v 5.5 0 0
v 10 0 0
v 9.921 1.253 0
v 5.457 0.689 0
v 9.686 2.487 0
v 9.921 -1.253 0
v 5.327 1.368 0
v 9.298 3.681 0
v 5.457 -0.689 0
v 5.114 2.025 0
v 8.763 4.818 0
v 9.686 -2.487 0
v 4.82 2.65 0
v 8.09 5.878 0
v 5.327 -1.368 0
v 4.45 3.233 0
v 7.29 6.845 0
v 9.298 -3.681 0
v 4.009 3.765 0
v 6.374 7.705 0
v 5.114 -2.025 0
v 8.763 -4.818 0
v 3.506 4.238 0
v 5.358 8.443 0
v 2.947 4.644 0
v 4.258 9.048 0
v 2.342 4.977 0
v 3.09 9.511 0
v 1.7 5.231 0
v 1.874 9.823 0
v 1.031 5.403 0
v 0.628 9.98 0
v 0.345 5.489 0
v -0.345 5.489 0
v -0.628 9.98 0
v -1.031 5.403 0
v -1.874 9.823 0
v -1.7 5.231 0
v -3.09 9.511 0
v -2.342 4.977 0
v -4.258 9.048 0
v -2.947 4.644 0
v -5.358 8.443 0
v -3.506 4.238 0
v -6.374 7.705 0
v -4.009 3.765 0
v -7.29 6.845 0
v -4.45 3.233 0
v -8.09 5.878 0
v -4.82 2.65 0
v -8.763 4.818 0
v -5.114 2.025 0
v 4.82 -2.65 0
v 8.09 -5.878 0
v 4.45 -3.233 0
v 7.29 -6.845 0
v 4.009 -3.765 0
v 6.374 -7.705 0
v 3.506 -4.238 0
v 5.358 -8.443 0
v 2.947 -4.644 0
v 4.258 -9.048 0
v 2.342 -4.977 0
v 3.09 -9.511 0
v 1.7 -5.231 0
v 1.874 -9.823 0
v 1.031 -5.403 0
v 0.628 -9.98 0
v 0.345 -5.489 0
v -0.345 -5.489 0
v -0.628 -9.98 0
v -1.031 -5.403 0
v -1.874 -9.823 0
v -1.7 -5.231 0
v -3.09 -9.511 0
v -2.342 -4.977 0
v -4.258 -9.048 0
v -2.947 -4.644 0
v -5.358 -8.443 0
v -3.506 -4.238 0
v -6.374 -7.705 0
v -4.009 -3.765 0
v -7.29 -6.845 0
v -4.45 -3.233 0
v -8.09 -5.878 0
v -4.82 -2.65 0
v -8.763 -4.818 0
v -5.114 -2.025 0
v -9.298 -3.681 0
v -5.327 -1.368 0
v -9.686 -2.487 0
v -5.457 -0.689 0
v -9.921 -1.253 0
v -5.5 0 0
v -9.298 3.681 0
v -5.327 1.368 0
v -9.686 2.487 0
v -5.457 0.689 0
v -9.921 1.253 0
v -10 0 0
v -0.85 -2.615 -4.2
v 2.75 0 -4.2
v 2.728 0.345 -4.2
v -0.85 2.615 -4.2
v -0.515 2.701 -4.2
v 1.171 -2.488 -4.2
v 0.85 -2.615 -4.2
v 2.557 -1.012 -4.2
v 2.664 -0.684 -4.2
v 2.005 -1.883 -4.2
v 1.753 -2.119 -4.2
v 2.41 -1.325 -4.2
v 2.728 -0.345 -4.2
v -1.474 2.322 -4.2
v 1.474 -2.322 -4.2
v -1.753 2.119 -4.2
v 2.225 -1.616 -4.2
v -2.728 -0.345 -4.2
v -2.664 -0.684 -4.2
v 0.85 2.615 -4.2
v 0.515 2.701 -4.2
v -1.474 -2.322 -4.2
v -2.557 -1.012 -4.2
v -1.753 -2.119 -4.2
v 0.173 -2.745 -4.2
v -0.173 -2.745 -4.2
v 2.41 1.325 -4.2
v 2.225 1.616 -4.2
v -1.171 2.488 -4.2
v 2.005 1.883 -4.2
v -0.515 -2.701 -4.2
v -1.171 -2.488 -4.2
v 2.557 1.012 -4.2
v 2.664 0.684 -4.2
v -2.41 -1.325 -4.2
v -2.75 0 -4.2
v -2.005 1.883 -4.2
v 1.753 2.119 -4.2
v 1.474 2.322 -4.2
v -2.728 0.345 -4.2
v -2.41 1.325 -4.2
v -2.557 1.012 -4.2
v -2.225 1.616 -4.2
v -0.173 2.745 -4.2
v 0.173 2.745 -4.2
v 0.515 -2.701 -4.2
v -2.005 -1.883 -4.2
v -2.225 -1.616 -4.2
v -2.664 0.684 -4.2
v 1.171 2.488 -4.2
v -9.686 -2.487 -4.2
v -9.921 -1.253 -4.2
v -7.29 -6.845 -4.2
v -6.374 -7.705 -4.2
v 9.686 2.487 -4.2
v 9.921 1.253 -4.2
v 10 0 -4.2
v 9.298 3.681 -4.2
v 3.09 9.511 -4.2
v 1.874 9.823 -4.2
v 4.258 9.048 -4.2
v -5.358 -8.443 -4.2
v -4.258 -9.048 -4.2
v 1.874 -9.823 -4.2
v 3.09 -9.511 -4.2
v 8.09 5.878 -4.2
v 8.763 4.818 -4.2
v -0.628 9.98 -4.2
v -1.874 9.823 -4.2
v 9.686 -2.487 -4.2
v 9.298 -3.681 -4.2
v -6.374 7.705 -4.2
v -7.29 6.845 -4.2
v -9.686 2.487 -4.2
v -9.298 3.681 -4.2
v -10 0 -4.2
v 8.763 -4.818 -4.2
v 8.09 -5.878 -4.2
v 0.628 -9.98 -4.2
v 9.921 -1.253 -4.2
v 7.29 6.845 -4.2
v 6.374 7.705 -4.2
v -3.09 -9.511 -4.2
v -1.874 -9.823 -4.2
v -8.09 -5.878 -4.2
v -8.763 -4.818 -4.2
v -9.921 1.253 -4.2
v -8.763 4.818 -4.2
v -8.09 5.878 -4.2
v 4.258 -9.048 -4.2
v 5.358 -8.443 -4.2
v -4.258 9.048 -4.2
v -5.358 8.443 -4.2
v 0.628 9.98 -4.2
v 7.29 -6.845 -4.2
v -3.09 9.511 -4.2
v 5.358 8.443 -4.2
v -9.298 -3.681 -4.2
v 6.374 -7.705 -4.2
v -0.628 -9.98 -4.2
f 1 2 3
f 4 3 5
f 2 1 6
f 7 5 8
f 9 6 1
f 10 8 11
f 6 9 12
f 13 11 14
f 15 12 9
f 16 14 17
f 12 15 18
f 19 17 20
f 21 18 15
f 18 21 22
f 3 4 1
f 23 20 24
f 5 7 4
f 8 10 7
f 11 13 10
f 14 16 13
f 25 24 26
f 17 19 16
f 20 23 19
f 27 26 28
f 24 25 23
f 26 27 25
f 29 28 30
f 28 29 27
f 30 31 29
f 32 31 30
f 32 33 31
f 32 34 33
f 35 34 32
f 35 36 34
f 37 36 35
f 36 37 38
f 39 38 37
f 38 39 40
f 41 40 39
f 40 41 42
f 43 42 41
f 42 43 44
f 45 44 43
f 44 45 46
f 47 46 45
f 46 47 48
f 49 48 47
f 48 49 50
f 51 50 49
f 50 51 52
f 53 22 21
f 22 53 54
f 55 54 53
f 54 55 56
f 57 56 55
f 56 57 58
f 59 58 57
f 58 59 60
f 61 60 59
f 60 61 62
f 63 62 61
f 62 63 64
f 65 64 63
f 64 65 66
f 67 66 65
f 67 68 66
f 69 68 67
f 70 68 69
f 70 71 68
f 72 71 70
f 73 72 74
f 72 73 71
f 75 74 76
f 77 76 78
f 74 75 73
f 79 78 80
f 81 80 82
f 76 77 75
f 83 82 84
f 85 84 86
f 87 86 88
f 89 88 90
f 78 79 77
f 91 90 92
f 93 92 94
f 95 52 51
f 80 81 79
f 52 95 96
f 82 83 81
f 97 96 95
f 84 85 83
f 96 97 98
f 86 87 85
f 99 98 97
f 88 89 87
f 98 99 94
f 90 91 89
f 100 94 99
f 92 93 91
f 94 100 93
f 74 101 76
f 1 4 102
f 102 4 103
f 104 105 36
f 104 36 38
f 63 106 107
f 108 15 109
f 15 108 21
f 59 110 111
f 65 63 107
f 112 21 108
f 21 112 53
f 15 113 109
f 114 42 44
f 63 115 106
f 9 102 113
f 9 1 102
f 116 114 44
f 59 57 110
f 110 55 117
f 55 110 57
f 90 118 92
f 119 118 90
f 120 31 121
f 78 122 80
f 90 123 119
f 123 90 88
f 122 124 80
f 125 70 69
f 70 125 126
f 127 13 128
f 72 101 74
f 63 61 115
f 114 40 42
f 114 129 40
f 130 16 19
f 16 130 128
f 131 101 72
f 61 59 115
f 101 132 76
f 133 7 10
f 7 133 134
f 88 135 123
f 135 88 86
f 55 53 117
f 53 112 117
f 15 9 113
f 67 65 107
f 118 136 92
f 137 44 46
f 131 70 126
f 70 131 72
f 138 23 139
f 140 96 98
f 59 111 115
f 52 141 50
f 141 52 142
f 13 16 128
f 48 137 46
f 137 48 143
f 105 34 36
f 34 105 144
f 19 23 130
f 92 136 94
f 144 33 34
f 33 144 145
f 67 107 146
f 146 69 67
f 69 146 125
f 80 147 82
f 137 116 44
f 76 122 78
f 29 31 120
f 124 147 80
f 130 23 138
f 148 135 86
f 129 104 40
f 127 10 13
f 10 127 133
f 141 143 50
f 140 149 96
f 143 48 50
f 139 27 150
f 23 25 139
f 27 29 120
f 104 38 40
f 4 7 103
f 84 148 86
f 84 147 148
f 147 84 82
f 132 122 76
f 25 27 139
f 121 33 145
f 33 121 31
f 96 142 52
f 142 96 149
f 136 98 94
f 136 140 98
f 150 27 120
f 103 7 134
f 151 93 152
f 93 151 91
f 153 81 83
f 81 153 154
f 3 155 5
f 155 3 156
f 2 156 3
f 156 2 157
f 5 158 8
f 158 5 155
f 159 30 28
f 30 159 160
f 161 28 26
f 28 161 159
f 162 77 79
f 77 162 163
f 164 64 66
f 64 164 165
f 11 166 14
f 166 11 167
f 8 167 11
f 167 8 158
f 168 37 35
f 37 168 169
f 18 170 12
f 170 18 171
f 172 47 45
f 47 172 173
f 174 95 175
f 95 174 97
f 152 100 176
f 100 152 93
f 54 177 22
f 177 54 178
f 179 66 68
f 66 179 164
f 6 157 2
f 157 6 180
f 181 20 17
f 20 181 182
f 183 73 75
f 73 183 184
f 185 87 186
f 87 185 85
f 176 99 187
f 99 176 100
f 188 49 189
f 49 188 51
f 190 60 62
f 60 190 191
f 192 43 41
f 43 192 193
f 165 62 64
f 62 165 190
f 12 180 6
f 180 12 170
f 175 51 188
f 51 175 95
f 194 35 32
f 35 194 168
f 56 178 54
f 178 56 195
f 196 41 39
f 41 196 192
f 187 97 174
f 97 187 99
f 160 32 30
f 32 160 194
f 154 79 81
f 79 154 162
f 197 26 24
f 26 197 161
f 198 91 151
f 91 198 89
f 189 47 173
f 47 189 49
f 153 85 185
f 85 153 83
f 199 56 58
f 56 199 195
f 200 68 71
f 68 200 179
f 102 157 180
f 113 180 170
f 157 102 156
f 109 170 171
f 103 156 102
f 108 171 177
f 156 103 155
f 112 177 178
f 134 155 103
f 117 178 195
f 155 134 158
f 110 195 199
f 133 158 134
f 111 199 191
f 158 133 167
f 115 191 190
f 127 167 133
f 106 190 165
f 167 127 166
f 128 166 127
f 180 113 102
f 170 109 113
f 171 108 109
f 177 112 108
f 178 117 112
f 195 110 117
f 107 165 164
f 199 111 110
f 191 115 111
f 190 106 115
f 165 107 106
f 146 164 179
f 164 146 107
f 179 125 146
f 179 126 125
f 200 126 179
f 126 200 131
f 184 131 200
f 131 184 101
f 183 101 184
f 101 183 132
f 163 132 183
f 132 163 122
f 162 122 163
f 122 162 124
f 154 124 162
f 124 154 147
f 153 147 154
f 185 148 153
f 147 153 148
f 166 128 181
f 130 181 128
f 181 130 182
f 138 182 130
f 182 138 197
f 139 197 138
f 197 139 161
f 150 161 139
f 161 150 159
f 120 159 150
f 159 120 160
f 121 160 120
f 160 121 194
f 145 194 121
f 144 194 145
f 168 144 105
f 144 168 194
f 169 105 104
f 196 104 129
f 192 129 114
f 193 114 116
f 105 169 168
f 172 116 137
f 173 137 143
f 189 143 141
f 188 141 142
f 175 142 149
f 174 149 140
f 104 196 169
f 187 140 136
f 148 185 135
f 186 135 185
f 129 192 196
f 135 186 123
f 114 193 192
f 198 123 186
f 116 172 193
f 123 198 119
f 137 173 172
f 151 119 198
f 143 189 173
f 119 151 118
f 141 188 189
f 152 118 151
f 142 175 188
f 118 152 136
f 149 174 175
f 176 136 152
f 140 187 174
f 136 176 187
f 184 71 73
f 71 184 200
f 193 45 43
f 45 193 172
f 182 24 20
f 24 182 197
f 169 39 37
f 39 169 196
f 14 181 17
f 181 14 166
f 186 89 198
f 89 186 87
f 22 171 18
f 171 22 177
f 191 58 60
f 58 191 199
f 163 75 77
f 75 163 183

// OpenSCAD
$fn = 50;

difference() {
	union() {
		translate(v = [0, 0, -4.2]) {
			cylinder(h = 4.2, r = 10.0);
		}
	}
	union() {
		translate(v = [0, 0, 0]) {
			rotate(a = [0, 0, 0]) {
				difference() {
					union() {
						translate(v = [0, 0, -7.2]) {
							cylinder(h = 7.2, r = 2.25);
						}
						translate(v = [0, 0, -4.2]) {
							cylinder(h = 4.2, r1 = 2.75, r2 = 5.5);
						}
						translate(v = [0, 0, -7.2]) {
							cylinder(h = 7.2, r = 2.75);
						}
						translate(v = [0, 0, -7.2]) {
							cylinder(h = 7.2, r = 2.25);
						}
					}
					union();
				}
			}
		}
	}
}
